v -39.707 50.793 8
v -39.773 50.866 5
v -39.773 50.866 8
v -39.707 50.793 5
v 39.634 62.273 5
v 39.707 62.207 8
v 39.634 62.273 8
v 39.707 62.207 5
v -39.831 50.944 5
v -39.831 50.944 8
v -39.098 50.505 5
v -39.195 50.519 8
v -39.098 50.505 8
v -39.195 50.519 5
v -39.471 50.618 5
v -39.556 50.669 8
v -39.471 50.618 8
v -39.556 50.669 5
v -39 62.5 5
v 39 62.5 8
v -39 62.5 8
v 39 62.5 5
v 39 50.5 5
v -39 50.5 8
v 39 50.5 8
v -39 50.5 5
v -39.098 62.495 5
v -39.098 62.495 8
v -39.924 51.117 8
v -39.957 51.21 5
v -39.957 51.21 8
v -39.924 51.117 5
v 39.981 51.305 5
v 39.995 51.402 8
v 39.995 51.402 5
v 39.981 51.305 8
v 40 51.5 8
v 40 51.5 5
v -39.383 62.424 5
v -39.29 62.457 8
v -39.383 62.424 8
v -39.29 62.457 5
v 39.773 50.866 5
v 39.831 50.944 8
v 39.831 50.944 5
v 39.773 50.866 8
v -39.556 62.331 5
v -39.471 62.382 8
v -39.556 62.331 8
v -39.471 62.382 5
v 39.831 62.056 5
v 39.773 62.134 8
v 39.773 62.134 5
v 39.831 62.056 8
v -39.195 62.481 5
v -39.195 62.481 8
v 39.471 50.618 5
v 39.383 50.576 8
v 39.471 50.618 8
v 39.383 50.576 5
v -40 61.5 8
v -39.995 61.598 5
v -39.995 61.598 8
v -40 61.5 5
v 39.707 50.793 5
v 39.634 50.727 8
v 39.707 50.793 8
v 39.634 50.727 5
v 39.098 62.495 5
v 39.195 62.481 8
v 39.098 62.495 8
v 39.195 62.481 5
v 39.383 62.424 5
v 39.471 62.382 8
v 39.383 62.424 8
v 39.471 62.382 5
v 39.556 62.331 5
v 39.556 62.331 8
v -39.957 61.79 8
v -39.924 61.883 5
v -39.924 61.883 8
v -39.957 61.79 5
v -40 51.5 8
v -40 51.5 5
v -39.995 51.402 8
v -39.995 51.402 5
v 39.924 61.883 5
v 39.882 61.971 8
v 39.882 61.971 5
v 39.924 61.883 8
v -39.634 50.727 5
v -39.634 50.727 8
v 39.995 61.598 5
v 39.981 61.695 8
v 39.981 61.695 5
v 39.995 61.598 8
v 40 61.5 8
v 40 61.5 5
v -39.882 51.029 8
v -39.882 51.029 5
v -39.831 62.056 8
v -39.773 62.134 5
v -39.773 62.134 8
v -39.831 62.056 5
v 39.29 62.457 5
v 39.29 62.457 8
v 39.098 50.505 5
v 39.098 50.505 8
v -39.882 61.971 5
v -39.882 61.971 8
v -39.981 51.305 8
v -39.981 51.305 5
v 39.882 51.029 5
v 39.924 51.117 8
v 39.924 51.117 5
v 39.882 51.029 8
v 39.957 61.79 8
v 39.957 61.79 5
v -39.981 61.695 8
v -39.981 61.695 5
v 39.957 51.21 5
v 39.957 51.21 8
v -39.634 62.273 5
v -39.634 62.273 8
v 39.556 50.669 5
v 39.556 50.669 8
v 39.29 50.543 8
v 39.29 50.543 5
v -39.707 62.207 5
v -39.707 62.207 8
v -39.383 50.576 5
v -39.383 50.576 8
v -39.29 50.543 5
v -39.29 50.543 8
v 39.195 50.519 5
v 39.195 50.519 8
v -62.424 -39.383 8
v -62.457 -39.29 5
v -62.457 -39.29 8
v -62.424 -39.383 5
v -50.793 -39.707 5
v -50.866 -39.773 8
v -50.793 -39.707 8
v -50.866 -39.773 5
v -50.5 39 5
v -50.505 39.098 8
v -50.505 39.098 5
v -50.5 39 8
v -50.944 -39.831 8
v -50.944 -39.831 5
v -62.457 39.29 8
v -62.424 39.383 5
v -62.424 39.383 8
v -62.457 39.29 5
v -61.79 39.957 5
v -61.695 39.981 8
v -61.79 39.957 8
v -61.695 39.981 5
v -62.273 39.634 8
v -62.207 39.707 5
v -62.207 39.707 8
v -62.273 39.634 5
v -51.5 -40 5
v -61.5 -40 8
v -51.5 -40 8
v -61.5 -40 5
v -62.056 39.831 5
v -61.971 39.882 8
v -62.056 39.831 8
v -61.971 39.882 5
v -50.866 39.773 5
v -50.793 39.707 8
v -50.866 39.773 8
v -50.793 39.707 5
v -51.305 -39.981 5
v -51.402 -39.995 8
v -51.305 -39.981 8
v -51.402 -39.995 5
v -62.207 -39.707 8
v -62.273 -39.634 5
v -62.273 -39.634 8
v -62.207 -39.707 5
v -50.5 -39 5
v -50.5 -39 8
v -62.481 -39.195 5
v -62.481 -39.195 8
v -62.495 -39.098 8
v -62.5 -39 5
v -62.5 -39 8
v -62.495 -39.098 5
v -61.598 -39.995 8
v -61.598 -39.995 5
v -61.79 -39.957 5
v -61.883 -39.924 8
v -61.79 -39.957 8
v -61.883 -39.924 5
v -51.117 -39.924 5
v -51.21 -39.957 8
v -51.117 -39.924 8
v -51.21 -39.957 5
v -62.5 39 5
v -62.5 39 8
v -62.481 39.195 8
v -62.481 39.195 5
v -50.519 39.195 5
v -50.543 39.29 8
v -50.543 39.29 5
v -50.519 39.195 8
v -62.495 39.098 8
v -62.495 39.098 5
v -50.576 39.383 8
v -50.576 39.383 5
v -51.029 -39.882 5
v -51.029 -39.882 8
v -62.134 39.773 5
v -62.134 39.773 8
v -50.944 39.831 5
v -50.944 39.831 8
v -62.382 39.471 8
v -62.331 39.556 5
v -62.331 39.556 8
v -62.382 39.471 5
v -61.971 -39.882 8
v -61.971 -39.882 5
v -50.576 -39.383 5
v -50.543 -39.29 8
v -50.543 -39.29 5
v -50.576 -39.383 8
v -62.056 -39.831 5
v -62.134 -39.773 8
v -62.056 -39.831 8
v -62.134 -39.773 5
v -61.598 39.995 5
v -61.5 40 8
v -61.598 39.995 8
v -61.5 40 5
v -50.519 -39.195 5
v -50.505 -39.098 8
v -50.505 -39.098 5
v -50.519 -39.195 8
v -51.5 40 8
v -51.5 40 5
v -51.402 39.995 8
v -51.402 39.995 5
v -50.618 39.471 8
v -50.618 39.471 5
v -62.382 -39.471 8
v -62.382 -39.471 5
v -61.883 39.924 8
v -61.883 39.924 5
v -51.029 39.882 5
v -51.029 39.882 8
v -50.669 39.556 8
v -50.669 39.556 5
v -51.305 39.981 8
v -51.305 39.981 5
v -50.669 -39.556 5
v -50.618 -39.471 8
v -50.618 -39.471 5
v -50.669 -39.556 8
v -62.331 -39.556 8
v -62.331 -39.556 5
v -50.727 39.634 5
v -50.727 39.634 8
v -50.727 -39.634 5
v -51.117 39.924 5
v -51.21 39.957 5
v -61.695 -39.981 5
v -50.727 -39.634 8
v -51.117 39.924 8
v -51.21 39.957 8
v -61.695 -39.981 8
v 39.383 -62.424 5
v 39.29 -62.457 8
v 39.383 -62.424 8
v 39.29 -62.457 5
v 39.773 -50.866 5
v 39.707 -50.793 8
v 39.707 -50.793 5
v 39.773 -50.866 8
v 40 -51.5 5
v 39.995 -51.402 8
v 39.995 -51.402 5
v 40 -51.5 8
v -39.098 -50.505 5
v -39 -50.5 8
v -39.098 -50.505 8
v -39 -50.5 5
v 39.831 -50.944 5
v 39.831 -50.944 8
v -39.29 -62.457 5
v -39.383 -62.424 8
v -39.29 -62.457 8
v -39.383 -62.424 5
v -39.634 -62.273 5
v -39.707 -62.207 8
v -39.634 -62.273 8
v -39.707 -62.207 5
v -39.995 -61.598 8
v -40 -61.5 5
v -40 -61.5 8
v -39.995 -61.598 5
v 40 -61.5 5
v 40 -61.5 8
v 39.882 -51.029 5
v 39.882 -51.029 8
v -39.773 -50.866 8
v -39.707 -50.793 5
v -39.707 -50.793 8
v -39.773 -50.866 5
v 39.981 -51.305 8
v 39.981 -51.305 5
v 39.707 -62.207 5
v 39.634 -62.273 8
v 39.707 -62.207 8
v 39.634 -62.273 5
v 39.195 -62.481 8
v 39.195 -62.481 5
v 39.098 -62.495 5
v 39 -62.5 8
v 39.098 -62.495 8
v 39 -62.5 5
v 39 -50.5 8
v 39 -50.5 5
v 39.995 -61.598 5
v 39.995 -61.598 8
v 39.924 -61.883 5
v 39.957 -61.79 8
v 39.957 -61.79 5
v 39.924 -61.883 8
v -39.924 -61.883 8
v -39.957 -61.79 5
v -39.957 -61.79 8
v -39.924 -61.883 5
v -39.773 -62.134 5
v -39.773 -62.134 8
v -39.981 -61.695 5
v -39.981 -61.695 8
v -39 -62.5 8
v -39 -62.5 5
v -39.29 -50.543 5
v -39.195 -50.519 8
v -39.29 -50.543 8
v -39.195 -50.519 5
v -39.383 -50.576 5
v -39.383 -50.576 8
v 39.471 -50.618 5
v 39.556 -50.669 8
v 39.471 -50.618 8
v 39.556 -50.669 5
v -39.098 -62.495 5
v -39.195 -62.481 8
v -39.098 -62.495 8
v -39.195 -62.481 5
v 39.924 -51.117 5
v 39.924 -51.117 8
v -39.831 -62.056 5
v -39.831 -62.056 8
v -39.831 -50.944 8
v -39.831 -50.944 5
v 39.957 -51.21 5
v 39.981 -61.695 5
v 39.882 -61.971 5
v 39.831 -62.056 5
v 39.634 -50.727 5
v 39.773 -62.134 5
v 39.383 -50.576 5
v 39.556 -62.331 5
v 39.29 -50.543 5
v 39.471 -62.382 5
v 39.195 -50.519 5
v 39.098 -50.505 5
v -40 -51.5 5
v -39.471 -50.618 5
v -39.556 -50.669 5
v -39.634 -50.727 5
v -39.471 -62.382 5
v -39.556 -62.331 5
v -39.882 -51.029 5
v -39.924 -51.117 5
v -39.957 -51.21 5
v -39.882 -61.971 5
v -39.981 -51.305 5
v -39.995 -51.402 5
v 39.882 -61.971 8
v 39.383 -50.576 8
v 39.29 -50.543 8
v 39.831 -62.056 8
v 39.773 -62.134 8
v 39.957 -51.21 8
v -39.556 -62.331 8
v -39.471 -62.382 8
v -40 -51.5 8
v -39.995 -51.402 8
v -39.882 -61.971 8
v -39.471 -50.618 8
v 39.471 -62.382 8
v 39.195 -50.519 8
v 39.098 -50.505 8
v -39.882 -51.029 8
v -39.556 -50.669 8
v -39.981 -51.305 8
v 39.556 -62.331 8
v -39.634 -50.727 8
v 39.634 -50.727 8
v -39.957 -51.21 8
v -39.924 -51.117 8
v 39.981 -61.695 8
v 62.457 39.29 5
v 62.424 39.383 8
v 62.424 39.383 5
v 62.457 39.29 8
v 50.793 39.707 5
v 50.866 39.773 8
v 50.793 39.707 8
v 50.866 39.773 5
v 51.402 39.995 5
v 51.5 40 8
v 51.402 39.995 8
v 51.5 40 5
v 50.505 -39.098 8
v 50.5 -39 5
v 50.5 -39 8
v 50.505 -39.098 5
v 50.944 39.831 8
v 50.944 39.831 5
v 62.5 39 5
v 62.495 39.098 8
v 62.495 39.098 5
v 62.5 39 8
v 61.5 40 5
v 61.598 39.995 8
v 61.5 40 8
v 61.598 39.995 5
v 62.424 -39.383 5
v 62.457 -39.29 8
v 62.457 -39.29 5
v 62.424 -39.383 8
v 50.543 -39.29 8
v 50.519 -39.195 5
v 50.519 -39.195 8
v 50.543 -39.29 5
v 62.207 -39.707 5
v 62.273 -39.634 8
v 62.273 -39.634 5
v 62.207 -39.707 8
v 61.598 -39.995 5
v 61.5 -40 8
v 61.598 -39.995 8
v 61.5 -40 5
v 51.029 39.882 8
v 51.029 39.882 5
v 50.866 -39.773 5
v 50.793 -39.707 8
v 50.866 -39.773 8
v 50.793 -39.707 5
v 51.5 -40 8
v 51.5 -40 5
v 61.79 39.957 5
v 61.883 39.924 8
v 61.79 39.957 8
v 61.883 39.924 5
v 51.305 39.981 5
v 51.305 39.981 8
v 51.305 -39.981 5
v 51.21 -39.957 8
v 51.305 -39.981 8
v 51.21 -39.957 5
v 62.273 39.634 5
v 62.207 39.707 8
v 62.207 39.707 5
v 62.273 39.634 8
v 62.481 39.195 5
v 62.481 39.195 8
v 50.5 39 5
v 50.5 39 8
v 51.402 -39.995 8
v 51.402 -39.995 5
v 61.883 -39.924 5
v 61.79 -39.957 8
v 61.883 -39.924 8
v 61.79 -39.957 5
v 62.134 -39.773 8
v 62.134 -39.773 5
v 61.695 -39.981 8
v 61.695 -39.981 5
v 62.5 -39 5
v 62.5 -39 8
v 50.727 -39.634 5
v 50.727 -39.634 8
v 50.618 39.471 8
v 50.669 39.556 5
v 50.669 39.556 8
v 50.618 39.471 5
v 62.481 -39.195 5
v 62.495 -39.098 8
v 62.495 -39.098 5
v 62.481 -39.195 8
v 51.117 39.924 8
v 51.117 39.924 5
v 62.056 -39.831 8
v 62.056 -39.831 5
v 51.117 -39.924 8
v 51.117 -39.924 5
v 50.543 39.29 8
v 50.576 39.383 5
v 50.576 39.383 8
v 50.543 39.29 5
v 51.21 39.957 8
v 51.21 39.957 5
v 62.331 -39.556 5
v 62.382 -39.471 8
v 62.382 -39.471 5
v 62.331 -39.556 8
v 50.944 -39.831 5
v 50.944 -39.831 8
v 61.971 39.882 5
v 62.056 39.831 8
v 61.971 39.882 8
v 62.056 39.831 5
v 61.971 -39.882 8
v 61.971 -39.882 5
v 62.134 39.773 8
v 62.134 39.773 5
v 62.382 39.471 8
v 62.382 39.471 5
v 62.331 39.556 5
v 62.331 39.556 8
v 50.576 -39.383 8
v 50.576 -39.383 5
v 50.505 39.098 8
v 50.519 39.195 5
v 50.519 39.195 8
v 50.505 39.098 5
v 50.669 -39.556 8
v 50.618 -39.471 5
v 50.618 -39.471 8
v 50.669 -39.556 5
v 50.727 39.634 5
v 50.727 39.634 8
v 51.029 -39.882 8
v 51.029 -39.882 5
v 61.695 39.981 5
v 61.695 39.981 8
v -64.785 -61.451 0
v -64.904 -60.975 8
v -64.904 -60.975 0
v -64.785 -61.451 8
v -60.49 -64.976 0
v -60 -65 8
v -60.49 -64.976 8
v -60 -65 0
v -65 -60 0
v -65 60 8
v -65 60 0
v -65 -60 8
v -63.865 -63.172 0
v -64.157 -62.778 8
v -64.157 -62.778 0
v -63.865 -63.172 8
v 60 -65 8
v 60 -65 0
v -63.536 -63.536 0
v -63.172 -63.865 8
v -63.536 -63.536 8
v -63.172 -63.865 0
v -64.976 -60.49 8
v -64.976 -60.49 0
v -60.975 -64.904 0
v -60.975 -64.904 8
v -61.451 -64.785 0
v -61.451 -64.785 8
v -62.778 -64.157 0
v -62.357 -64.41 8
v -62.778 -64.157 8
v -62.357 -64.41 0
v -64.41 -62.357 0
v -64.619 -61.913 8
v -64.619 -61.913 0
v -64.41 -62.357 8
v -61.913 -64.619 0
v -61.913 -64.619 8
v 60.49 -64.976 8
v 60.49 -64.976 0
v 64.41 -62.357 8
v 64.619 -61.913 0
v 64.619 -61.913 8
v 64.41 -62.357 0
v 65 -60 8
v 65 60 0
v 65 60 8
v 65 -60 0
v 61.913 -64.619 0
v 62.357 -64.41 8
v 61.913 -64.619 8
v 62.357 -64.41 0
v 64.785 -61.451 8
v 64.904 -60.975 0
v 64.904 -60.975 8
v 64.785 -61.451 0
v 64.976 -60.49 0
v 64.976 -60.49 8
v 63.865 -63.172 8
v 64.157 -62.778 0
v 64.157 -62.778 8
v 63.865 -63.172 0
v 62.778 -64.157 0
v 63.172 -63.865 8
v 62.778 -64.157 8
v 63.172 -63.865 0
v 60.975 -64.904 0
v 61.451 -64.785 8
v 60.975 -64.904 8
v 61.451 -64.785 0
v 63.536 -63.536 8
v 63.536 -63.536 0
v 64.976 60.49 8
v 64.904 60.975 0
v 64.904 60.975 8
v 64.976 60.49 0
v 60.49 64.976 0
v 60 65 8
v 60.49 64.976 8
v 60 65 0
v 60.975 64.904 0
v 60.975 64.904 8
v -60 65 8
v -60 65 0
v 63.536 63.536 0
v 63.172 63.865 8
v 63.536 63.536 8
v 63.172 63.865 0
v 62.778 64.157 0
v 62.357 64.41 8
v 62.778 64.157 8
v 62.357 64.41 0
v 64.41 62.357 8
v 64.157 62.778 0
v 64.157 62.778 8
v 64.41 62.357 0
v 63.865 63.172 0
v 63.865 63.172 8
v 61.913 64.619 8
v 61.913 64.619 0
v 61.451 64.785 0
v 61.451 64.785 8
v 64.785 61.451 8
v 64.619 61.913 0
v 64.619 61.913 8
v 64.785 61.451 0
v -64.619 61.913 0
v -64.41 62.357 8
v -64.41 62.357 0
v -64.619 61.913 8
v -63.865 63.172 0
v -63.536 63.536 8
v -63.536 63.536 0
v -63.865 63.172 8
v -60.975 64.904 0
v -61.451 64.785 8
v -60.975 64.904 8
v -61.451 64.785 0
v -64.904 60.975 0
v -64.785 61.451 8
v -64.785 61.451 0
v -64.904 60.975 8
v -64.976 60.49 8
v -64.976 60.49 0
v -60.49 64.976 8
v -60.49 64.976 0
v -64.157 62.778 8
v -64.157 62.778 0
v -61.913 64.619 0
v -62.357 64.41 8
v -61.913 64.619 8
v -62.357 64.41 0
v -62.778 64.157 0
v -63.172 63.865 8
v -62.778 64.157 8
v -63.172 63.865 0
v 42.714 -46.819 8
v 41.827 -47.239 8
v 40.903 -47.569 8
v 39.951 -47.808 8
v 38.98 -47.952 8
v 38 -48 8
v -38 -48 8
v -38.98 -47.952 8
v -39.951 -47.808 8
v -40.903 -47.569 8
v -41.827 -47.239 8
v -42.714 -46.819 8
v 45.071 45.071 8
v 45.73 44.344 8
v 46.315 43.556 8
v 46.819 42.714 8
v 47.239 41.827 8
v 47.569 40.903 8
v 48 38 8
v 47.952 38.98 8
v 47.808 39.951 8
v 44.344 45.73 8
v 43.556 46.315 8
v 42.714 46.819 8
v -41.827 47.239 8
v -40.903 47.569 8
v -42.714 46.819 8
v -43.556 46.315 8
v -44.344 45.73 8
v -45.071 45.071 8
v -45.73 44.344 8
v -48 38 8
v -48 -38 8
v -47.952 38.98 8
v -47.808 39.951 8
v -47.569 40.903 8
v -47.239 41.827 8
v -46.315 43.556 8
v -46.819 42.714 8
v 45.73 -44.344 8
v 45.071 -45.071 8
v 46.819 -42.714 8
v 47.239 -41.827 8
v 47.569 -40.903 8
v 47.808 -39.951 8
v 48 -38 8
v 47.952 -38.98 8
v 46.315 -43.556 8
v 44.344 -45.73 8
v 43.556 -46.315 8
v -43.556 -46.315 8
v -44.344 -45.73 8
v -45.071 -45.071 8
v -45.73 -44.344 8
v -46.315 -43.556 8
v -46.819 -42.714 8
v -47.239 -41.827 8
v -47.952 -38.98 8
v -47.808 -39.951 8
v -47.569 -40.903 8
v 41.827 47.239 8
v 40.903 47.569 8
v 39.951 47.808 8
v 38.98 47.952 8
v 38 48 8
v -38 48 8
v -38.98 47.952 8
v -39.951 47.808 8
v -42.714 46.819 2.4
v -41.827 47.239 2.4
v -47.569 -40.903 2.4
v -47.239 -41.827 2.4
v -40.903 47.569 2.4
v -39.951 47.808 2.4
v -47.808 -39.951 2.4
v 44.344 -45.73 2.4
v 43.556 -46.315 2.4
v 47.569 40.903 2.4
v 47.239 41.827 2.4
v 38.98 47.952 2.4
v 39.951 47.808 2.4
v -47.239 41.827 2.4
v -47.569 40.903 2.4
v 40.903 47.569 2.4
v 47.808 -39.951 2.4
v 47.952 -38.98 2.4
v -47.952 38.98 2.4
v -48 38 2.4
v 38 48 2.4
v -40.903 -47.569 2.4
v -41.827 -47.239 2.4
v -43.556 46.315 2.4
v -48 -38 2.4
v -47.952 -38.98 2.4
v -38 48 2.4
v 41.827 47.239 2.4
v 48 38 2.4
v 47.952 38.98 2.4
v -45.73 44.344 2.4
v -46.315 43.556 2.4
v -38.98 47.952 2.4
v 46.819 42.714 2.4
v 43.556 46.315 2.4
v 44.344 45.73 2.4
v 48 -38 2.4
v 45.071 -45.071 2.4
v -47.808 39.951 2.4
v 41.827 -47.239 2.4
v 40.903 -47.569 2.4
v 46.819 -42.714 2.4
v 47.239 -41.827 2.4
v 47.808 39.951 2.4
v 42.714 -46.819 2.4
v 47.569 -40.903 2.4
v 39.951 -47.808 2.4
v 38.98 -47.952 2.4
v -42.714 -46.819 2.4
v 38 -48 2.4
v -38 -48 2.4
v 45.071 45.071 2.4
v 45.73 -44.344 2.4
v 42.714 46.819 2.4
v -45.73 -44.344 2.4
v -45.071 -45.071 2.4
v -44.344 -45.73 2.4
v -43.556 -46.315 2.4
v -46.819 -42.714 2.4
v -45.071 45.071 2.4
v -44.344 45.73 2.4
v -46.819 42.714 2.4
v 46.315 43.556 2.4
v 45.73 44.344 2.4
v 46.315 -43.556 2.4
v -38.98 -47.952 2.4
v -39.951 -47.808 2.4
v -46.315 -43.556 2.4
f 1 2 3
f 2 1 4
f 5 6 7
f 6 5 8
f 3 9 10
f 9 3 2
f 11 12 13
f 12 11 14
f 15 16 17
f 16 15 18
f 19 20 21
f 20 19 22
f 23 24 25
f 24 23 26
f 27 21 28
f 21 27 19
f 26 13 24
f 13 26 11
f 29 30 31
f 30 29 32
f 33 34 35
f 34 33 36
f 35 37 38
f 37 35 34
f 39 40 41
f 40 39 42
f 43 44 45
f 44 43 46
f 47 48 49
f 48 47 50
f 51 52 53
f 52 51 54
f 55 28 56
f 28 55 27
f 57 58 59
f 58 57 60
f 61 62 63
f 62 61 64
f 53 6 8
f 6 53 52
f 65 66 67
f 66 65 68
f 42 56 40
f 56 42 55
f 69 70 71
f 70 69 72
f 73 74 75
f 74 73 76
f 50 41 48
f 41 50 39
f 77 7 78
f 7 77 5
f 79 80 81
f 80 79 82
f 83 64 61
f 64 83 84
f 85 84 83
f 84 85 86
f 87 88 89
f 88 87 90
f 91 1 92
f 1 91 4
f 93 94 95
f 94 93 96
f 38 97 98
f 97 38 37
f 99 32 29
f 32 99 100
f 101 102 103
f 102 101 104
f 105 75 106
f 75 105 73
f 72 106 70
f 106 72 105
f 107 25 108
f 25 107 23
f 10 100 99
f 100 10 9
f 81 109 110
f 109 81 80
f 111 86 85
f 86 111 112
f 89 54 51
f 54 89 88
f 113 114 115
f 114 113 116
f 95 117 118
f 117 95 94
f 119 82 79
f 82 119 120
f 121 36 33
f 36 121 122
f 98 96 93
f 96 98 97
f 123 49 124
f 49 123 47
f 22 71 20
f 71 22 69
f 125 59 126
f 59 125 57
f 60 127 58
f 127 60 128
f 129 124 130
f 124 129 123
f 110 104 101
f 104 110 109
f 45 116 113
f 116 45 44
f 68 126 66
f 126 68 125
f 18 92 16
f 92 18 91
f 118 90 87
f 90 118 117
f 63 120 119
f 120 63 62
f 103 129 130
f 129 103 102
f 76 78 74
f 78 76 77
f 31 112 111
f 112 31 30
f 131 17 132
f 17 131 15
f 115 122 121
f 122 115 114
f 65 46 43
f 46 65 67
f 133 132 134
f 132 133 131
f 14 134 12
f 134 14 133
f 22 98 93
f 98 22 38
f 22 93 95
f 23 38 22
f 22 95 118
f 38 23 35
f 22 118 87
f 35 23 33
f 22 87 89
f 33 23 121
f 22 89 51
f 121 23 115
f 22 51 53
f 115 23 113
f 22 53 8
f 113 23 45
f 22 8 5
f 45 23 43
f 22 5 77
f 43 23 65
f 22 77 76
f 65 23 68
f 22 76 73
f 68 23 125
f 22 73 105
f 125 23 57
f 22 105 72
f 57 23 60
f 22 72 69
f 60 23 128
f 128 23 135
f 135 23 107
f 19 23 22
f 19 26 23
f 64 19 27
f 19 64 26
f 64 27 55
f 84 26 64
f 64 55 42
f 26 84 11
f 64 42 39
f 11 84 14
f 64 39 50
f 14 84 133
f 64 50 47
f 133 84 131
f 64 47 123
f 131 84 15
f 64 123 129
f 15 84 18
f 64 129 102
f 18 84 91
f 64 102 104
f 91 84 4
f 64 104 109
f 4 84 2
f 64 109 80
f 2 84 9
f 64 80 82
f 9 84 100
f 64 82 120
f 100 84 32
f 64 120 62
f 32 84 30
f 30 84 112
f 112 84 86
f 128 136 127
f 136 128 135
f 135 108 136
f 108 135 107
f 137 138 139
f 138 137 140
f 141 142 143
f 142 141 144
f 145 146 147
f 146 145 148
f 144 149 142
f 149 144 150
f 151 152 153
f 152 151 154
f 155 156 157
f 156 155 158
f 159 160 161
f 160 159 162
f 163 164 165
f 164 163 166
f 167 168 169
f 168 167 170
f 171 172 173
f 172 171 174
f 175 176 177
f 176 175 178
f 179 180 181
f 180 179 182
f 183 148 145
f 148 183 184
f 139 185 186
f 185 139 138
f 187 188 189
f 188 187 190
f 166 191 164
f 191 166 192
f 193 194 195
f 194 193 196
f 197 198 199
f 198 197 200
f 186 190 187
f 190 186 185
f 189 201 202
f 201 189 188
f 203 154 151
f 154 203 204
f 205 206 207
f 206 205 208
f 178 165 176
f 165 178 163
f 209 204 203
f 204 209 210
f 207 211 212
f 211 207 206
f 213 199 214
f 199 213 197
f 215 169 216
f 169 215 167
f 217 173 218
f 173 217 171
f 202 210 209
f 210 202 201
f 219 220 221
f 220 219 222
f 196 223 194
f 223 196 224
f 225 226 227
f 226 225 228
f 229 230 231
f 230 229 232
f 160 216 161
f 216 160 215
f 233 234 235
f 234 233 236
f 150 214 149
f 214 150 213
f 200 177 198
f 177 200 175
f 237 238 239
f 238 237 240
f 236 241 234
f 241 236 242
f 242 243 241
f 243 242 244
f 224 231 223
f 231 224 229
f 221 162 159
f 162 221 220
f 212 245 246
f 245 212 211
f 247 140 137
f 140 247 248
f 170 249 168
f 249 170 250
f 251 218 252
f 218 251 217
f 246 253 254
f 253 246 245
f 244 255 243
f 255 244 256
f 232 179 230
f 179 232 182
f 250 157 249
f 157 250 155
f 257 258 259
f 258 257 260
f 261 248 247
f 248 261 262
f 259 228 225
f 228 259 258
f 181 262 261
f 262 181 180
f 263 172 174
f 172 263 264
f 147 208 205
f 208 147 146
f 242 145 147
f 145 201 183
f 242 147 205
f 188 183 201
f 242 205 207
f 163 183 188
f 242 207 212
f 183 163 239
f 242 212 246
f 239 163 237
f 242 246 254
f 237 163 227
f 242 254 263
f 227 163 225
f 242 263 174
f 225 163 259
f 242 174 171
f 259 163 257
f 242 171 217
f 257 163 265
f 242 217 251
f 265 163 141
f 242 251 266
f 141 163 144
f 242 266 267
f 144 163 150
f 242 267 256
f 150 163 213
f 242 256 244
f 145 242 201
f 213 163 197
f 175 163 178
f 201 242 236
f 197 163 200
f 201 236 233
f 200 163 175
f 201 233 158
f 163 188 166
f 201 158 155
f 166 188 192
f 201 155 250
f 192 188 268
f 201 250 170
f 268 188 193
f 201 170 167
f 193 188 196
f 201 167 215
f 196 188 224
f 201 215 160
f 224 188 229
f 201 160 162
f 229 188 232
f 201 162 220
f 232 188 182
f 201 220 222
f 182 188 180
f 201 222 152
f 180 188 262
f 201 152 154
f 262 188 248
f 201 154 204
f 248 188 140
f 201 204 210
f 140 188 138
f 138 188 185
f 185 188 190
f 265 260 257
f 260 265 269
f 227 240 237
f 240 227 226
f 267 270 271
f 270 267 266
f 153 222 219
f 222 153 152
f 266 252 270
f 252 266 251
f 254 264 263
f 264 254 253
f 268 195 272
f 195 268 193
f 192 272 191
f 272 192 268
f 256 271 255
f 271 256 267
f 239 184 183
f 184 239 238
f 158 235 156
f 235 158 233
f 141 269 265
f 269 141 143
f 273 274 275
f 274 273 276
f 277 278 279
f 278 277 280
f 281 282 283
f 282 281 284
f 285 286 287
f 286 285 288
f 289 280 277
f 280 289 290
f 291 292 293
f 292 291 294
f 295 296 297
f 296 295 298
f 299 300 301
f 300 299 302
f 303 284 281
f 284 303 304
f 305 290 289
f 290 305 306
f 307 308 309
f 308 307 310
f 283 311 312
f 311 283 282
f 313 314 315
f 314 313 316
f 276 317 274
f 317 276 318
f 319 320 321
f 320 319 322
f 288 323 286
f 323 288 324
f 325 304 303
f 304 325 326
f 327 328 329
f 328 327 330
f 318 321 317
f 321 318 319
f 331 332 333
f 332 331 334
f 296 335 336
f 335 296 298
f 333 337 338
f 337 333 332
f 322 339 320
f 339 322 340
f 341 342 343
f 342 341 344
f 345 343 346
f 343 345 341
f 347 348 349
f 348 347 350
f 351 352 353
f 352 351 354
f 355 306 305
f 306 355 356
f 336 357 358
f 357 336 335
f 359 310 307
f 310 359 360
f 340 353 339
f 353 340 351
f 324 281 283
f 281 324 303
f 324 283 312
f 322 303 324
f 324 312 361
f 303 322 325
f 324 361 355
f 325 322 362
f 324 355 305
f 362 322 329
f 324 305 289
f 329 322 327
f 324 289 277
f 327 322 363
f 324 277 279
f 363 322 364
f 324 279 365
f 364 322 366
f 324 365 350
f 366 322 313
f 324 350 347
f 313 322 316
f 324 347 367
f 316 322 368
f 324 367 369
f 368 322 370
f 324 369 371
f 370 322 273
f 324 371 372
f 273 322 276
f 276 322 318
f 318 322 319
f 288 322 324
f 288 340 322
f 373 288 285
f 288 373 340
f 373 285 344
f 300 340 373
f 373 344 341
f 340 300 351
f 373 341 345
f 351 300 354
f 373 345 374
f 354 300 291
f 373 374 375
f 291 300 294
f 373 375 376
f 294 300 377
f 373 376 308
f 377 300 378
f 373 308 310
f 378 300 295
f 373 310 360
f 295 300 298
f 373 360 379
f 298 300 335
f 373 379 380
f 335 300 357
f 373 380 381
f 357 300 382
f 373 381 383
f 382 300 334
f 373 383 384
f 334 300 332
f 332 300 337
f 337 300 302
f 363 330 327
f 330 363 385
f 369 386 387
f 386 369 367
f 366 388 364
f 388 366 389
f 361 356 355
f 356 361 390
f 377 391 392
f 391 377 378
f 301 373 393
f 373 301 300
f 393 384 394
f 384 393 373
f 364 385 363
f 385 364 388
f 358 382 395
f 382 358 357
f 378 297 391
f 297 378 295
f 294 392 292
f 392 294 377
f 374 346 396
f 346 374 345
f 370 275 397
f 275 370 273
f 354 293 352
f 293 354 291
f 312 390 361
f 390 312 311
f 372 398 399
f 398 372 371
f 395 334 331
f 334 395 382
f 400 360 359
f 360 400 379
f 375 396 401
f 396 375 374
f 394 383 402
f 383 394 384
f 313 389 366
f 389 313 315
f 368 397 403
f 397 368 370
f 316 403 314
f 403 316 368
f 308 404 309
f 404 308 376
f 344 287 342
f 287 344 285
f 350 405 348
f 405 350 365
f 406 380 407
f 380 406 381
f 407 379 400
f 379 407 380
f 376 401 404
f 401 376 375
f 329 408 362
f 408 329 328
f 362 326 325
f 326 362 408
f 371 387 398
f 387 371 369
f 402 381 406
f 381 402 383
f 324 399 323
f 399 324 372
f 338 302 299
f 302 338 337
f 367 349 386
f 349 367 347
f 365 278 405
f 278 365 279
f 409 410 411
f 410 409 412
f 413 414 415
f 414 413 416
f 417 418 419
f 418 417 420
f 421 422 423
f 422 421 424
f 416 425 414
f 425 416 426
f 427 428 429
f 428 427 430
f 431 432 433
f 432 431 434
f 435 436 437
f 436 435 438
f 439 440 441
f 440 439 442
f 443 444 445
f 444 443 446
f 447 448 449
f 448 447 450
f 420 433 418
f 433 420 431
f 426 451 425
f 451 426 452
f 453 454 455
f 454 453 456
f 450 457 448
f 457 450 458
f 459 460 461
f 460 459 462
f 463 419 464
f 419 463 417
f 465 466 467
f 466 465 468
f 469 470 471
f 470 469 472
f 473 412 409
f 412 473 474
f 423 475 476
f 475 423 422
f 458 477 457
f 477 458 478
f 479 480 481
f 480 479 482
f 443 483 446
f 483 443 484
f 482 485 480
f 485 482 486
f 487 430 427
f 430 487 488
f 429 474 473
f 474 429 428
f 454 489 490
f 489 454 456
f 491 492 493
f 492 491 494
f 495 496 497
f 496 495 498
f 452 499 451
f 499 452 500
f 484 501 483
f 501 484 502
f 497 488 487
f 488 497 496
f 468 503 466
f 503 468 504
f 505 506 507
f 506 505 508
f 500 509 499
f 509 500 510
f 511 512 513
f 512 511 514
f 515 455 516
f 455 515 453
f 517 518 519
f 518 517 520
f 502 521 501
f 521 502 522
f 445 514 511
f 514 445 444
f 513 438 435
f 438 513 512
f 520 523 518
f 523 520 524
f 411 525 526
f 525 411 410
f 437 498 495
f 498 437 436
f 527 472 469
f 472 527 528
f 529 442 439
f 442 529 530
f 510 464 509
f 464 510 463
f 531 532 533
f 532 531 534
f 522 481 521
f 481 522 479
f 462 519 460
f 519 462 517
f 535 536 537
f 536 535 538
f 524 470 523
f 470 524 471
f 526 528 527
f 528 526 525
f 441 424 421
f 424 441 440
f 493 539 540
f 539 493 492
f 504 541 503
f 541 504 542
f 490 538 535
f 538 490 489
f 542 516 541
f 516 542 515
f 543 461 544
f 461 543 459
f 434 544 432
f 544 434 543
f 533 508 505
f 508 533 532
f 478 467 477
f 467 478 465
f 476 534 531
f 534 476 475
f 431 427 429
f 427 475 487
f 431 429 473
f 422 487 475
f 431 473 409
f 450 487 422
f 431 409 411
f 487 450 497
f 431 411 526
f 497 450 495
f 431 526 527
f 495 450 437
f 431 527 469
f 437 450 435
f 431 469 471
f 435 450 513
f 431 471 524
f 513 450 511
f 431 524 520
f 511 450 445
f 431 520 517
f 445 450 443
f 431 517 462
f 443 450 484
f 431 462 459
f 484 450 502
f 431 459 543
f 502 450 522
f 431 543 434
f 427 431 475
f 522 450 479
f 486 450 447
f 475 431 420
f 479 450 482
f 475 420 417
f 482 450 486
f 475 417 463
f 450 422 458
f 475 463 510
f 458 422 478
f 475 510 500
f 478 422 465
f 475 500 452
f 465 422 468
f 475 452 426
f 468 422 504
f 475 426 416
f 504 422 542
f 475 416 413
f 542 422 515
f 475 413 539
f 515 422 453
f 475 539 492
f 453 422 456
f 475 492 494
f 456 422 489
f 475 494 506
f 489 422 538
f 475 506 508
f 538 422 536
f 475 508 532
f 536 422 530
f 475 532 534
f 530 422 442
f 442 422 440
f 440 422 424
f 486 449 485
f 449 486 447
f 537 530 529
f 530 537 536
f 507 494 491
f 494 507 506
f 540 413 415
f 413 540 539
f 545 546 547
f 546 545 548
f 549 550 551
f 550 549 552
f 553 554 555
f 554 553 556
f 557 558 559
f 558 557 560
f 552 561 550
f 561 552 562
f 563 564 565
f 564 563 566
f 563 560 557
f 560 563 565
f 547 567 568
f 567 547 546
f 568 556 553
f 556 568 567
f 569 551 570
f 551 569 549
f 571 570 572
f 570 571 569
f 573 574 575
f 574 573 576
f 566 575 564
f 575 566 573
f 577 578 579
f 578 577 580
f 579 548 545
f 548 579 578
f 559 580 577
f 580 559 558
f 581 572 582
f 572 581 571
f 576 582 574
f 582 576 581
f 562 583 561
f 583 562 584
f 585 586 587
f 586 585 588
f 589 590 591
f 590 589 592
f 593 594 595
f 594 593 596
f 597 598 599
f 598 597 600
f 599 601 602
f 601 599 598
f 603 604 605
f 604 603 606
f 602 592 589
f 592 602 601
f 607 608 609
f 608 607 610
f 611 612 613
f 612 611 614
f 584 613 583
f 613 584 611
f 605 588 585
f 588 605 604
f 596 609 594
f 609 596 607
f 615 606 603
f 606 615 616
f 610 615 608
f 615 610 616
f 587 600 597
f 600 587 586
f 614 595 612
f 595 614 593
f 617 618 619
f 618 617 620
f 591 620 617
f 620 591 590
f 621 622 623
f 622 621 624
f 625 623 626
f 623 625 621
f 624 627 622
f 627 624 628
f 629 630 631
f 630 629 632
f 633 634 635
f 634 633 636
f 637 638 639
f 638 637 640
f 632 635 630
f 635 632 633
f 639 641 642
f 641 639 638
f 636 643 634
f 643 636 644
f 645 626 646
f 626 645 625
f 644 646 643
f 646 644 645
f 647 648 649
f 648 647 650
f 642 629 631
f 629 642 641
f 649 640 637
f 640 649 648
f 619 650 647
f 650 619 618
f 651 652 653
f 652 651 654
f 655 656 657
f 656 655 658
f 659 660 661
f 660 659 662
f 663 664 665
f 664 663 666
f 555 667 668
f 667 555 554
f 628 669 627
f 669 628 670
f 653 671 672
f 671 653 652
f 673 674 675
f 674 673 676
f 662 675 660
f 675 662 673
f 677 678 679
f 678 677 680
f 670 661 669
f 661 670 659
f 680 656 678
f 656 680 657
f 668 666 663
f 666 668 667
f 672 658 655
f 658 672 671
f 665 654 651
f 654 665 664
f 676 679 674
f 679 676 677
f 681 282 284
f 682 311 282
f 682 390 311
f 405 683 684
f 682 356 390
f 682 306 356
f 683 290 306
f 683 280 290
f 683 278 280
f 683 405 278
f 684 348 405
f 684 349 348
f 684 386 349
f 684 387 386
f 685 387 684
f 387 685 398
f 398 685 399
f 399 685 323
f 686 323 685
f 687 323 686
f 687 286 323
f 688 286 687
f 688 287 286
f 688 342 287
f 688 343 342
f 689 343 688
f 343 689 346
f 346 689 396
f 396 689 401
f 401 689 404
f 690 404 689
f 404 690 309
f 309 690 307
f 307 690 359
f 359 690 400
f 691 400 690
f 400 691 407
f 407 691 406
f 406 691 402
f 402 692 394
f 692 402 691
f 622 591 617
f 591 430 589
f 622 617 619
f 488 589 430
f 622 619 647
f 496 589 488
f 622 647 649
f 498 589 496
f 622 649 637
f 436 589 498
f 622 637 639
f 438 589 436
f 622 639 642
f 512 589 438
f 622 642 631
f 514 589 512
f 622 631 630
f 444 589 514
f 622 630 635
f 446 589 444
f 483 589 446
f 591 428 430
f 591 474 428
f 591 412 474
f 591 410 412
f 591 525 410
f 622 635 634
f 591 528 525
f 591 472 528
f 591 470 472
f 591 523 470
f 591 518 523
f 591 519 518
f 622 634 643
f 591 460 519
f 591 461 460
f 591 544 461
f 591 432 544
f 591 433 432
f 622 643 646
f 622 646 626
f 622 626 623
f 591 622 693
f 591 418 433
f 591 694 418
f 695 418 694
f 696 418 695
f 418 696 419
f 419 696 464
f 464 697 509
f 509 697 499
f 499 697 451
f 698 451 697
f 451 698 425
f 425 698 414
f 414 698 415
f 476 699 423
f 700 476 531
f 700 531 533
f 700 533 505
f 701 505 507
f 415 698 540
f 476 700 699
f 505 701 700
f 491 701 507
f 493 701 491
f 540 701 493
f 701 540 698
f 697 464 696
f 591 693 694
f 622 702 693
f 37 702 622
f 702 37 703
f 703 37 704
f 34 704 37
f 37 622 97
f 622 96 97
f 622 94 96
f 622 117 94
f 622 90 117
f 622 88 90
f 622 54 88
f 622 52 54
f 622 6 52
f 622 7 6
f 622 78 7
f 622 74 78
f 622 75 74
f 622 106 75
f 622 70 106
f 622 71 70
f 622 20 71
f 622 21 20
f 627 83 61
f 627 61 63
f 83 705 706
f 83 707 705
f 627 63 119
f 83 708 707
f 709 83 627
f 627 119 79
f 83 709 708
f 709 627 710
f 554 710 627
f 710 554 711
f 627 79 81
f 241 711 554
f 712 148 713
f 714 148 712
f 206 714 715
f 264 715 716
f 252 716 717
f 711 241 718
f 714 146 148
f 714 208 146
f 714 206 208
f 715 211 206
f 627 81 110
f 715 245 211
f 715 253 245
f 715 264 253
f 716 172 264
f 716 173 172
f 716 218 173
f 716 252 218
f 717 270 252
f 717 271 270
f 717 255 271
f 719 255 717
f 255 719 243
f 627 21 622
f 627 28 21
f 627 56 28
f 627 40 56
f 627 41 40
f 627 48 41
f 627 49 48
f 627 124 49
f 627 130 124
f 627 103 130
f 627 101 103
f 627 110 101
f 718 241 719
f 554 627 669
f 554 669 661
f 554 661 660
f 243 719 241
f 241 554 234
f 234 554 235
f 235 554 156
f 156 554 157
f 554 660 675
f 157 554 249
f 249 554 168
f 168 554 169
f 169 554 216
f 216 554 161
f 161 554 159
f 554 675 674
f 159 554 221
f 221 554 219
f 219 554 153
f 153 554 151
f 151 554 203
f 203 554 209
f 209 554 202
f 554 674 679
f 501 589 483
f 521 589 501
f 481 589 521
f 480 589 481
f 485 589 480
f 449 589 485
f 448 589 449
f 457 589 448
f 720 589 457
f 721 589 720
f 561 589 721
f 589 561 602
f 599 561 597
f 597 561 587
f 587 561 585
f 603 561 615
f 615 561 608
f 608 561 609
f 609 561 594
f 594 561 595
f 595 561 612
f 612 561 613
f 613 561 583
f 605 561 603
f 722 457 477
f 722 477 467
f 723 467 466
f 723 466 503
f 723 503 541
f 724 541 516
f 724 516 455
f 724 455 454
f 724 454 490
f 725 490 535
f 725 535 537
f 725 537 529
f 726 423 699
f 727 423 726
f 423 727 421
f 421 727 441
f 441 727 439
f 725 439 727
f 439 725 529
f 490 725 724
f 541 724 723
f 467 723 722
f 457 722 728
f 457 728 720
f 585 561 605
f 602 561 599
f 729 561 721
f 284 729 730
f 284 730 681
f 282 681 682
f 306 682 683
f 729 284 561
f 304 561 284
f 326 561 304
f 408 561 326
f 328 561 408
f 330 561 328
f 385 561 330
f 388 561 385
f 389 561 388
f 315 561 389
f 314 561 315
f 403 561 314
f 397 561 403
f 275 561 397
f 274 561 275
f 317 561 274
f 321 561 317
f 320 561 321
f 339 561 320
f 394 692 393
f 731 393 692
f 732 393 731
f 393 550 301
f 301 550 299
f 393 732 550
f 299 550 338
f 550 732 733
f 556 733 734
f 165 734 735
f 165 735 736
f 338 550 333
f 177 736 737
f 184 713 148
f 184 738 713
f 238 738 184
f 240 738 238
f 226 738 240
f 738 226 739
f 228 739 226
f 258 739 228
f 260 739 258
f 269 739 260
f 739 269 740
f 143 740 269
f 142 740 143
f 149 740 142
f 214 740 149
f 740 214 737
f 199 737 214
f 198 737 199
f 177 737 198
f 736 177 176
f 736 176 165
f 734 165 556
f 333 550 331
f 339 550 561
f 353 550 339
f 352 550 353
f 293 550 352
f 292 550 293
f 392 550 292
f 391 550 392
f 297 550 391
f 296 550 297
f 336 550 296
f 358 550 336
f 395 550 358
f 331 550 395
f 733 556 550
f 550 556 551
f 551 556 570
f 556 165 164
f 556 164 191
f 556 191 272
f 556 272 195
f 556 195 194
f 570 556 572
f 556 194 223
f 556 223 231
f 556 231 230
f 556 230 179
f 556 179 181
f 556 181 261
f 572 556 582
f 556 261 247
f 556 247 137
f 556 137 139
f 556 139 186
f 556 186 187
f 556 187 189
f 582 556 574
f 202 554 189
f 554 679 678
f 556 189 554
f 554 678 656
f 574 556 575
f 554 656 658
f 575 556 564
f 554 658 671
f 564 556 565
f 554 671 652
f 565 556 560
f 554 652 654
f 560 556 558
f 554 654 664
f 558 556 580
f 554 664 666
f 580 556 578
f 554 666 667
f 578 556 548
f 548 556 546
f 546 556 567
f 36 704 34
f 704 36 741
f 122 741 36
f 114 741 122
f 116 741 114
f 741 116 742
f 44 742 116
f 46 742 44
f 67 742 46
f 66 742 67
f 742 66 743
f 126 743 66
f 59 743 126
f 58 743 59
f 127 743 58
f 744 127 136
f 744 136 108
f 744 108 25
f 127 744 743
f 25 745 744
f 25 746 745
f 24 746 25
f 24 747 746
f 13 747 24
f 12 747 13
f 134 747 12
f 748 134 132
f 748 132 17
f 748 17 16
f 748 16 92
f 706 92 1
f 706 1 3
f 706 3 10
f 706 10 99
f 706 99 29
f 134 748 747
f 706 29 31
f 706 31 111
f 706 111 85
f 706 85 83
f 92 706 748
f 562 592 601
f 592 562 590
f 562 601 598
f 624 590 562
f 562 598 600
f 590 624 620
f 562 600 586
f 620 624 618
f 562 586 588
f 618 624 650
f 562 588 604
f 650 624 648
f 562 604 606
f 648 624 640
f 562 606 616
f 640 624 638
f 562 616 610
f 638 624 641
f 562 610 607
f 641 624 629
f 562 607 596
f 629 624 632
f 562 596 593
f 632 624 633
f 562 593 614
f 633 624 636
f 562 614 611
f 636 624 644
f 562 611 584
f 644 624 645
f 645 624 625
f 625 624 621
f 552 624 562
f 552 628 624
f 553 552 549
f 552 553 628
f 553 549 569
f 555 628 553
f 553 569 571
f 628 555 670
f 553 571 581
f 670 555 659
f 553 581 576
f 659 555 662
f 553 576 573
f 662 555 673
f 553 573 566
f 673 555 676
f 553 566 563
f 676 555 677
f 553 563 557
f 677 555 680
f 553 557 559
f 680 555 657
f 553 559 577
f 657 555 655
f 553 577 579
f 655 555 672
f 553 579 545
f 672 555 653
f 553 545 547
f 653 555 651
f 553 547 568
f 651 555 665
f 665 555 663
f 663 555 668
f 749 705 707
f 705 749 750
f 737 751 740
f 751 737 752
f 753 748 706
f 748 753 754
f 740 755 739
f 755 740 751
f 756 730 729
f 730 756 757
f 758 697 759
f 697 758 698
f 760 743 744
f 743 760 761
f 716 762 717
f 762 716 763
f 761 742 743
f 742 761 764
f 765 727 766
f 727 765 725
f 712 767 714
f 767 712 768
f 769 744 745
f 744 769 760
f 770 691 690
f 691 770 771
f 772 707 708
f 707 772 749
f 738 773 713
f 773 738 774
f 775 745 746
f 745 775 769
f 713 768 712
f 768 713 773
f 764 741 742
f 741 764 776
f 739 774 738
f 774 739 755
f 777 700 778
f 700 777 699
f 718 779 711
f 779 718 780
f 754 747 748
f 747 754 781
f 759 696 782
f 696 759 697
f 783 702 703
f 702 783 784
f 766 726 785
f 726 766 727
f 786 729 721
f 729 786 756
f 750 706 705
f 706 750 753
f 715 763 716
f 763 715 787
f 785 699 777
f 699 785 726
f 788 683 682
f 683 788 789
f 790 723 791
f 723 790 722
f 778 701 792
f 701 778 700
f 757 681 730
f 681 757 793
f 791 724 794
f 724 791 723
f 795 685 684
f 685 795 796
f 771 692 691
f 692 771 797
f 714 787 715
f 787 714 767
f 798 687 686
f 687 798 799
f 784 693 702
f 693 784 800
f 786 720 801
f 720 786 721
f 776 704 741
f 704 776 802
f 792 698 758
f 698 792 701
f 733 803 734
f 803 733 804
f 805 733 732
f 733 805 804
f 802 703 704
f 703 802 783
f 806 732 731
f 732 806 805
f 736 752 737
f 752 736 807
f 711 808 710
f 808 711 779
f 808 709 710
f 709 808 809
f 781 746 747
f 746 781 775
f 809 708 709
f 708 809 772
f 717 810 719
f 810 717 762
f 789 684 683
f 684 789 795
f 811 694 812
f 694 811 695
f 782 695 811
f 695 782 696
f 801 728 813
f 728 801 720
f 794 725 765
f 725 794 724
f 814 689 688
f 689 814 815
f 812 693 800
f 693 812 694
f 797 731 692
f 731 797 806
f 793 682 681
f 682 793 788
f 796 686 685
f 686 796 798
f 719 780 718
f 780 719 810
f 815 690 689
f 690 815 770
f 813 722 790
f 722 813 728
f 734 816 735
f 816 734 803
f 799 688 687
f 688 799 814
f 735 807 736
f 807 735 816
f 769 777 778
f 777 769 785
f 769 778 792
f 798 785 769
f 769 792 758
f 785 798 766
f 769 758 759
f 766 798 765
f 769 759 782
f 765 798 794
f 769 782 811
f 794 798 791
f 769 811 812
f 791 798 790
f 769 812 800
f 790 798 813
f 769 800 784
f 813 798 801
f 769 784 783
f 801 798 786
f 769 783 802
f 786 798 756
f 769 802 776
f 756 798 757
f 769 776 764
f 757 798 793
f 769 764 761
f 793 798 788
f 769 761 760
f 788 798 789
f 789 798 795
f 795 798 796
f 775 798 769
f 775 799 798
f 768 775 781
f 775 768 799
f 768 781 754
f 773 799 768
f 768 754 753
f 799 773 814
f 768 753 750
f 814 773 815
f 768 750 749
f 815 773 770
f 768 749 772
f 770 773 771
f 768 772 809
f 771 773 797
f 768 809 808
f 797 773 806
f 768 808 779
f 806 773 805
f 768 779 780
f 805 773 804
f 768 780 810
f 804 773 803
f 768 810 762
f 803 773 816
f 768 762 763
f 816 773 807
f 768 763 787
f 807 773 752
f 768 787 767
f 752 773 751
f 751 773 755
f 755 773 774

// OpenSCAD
/* 손탁 중앙 정렬판 — 130mm 시제품, 방위 표시 포함
본체 노랑 / 주사위 바닥 녹색. part에서 색상별 부품을 선택해 같은 좌표로 내보내세요.
단위 mm. 리치봉 홈 80 x 12 x 깊이 3, 바닥 패드 홈 없음.
東: 빨간 바탕 / 검정 글자, 南西北: 짙은 회색 바탕 / 옅은 회색 글자.
표시를 윗면과 같은 높이의 인레이로 구성. 출력 시 다색 재료 또는 도색 필요.
STL은 색상 정보를 저장하지 않음. part 선택으로 같은 원점의 부품을 내보낼 수 있음.
별도 접착 조립용 공차는 넣지 않았으며 다색 출력/도색을 위한 설계임.
글자 윤곽이 내장되어 폰트 설치 불필요. Noto Sans CJK KR Bold (SIL OFL) 윤곽 사용.
*/
/* [기본 치수 / mm] */
// 전체 가로·세로
side = 130;
// 전체 높이
height = 8;
// 외곽 모서리 반경. 정렬 직선 구간 120mm
corner_radius = 5;
// 주사위 트레이 내부 가로·세로
tray_size = 96;
// 주사위 트레이 바닥 두께. 기본 트레이 깊이 5.6mm
floor_thickness = 2.4;
// 트레이 내부 모서리 반경
tray_radius = 10;

/* [표시용 얕은 홈] */
label_recesses = true;
label_depth = 3.0;
dealer_width = 80;
dealer_length = 12;
wind_width = 26;
wind_length = 8;

/* [바닥 패드 홈] */
pad_recesses = false;
pad_diameter = 10.4;
pad_depth = 0.5;
pad_inset = 12;

/* [방위 표시] */
// 각 자리에서 왼쪽 아래. 아래 東, 오른쪽 南, 위 西, 왼쪽 北.
// assembled: 색상 미리보기. 나머지는 동일 원점의 다색 출력용 부품.
part = "assembled"; // [assembled,body,tray,east_background,other_backgrounds,east_letter,other_letters,backgrounds,letters]
// 녹색 주사위 바닥 표면층 두께
tray_color_depth = 0.6;
badge_size = dealer_length * 1.5;
// 중앙을 향하는 모서리의 둥근 처리 반경
badge_inner_radius = 3;
badge_depth = 1;
letter_depth = 0.6;
letter_size = 10;

/* [Hidden] */
$fn = 64;
eps = 0.02;
rim = (side - tray_size)/2;
label_y = tray_size/2 + rim/2;

assert(side > 0 && height > 0);
assert(corner_radius > 0 && corner_radius < side/2);
assert(tray_radius > 0 && tray_radius < tray_size/2);
assert(tray_size > 0 && rim >= 3, "트레이 주변 벽 두께는 최소 3mm로 설정하세요.");
assert(floor_thickness >= 1.2 && floor_thickness < height);
assert(side - 2*corner_radius >= 120, "정렬 직선 구간은 120mm 이상으로 설정하세요.");
assert(!label_recesses || (rim >= 16 && label_depth > 0 && label_depth < height-1));
assert(!label_recesses || (dealer_length <= rim-4 && wind_length <= rim-4));
assert(!label_recesses || (dealer_width <= tray_size-4 && wind_width <= tray_size/2-10));
assert(!pad_recesses || (pad_depth > 0 && pad_depth < floor_thickness));
assert(!pad_recesses || (pad_inset > corner_radius+pad_diameter/2 && pad_inset < side/2-pad_diameter/2));

module rounded_rect(w, d, r) {
    hull()
        for (x=[-1,1], y=[-1,1])
            translate([x*(w/2-r), y*(d/2-r)])
                circle(r=r);
}

module shallow_slot(w,d) {
    translate([0,0,height-label_depth])
        linear_extrude(height=label_depth+eps)
            rounded_rect(w,d,1);
}

module center_body() {
    difference() {
        linear_extrude(height=height)
            rounded_rect(side,side,corner_radius);
        translate([0,0,floor_thickness-tray_color_depth])
            linear_extrude(height=height-floor_thickness+tray_color_depth+eps)
                rounded_rect(tray_size,tray_size,tray_radius);
        if (label_recesses) {
            for (a=[0,90,180,270])
                rotate([0,0,a])
                    translate([0,label_y,0])
                        shallow_slot(dealer_width,dealer_length);
            // 동/남 표식은 친 표시 홈과 겹치지 않게 한쪽으로 배치
            /*translate([tray_size/2-wind_width/2,label_y,0])
                shallow_slot(wind_width,wind_length);*/
        }
        for (i=[0:3])
            translate([0,0,height-badge_depth])
                linear_extrude(height=badge_depth+eps) badge_shape(i);
        if (pad_recesses)
            for (x=[-1,1], y=[-1,1])
                translate([x*(side/2-pad_inset),y*(side/2-pad_inset),-eps])
                    cylinder(d=pad_diameter,h=pad_depth+eps);
    }
}



// 모서리 여백 0mm. 사각 영역을 판의 외곽으로 잘라 둥근 모서리까지 배경색이 이어집니다.
// x/y 기준점이 같아 판의 대각선에 대해 대칭입니다.
badge_anchor = -side/2;
tray_corner_center = -tray_size/2 + tray_radius;
assert(badge_anchor + badge_size < -dealer_width/2, "방위 표식이 리치봉 홈과 겹칩니다.");
assert(sqrt(2)*abs(badge_anchor + badge_size - tray_corner_center) >= tray_radius,
       "방위 표식이 주사위 트레이와 겹칩니다.");
assert(badge_depth > letter_depth && letter_depth > 0 && badge_depth < height);
assert(letter_size < badge_size-2);
assert(badge_inner_radius > 0 && badge_inner_radius < badge_size/2);

module badge_location(i) {
    rotate([0,0,90*i])
        translate([badge_anchor+badge_size/2,badge_anchor+badge_size/2,0]) children();
}
module badge_shape(i) {
    intersection() {
        rounded_rect(side,side,corner_radius);
        badge_location(i) difference() {
            square([badge_size,badge_size],center=true);
            // 기본 좌하단 표식의 우상단 모서리만 둥글게 처리하고 각 자리로 회전.
            translate([badge_size/2-badge_inner_radius,badge_size/2-badge_inner_radius])
                difference() {
                    square([badge_inner_radius+eps,badge_inner_radius+eps]);
                    circle(r=badge_inner_radius);
                }
        }
    }
}
module glyph(i) {
    scale([letter_size,letter_size]) glyph_outline(i);
}
module letter(i) {
    badge_location(i) translate([0,0,height-letter_depth])
        linear_extrude(height=letter_depth) glyph(i);
}
module background(i) {
    difference() {
        translate([0,0,height-badge_depth])
            linear_extrude(height=badge_depth) badge_shape(i);
        badge_location(i) translate([0,0,height-letter_depth])
            linear_extrude(height=letter_depth+eps) glyph(i);
    }
}
assert(tray_color_depth > 0 && tray_color_depth < floor_thickness);
// 녹색 표면층은 원래 바닥 높이와 일치하며, 아래 본체와 빈틈 없이 맞닿음.
module tray_surface() {
    translate([0,0,floor_thickness-tray_color_depth])
        linear_extrude(height=tray_color_depth)
            rounded_rect(tray_size,tray_size,tray_radius);
}
// 각 색상 부품의 불리언 연산을 먼저 확정하여 F5 미리보기의 동일 평면 잔상을 방지.
// 치수, 부품 경계, 출력용 형상은 변경하지 않습니다.
if (part=="assembled" || part=="body") color([1.0,0.82,0.05]) render(convexity=10) center_body();
if (part=="assembled" || part=="tray") color([0.53,0.72,0.18]) render(convexity=10) tray_surface();
for(i=[0:3]) {
    if(part=="assembled" || part=="backgrounds" || (part=="east_background" && i==0) || (part=="other_backgrounds" && i>0))
        color(i==0 ? [0.82,0.04,0.06] : [0.18,0.19,0.21]) render(convexity=10) background(i);
    if(part=="assembled" || part=="letters" || (part=="east_letter" && i==0) || (part=="other_letters" && i>0))
        color(i==0 ? [0.02,0.02,0.02] : [0.82,0.83,0.85]) render(convexity=10) letter(i);
}

// Embedded normalized CJK outlines, 東 南 西 北
module glyph_outline(i) {
    if(i==0) polygon(points=[[-0.380575, 0.230922], [-0.380575, -0.176082], [-0.165015, -0.176082], [-0.315576, -0.297076], [-0.5, -0.376941], [-0.452015, -0.427073], [-0.412289, -0.483647], [-0.227866, -0.388008], [-0.070862, -0.243641], [-0.070862, -0.496366], [0.061282, -0.496366], [0.061282, -0.238355], [0.220846, -0.388008], [0.409151, -0.485795], [0.449207, -0.426577], [0.5, -0.375785], [0.311282, -0.296498], [0.157417, -0.176082], [0.385861, -0.176082], [0.385861, 0.230922], [0.061282, 0.230922], [0.061282, 0.291212], [0.469277, 0.291212], [0.469277, 0.409647], [0.061282, 0.409647], [0.061282, 0.496366], [-0.070862, 0.496366], [-0.070862, 0.409647], [-0.469442, 0.409647], [-0.469442, 0.291212], [-0.070862, 0.291212], [-0.070862, 0.230922], [-0.256855, -0.016353], [-0.070862, -0.016353], [-0.070862, -0.080938], [-0.256855, -0.080938], [0.061282, -0.016353], [0.255864, -0.016353], [0.255864, -0.080938], [0.061282, -0.080938], [-0.256855, 0.135778], [-0.070862, 0.135778], [-0.070862, 0.072349], [-0.256855, 0.072349], [0.061282, 0.135778], [0.255864, 0.135778], [0.255864, 0.072349], [0.061282, 0.072349]], paths=[[0, 1, 2, 3, 4, 5, 6, 7, 8, 9, 10, 11, 12, 13, 14, 15, 16, 17, 18, 19, 20, 21, 22, 23, 24, 25, 26, 27, 28, 29, 30, 31], [32, 33, 34, 35], [36, 37, 38, 39], [40, 41, 42, 43], [44, 45, 46, 47]]);
    if(i==1) polygon(points=[[-0.068884, 0.5], [-0.068884, 0.418347], [-0.477487, 0.418347], [-0.477487, 0.297883], [-0.068884, 0.297883], [-0.068884, 0.217238], [-0.436492, 0.217238], [-0.436492, -0.5], [-0.30746, -0.5], [-0.30746, 0.098958], [-0.101142, 0.098958], [-0.199933, 0.069892], [-0.168263, 0.012349], [-0.146169, -0.044019], [-0.240927, -0.044019], [-0.240927, -0.143985], [-0.064516, -0.143985], [-0.064516, -0.215054], [-0.263441, -0.215054], [-0.263441, -0.318212], [-0.064516, -0.318212], [-0.064516, -0.471942], [0.056956, -0.471942], [0.056956, -0.318212], [0.263441, -0.318212], [0.263441, -0.215054], [0.056956, -0.215054], [0.056956, -0.143985], [0.239751, -0.143985], [0.239751, -0.044019], [0.146169, -0.044019], [0.177923, 0.00756], [0.211862, 0.067708], [0.103159, 0.09795], [0.074177, 0.026378], [0.037634, -0.041835], [0.045195, -0.044019], [-0.11828, -0.044019], [-0.036626, -0.017137], [-0.060736, 0.039819], [-0.096774, 0.098958], [0.305444, 0.098958], [0.305444, -0.370968], [0.302167, -0.389785], [0.27957, -0.392473], [0.229083, -0.393481], [0.142977, -0.390289], [0.169355, -0.444052], [0.18498, -0.5], [0.303763, -0.499412], [0.379536, -0.480679], [0.430108, -0.448337], [0.437668, -0.370968], [0.437668, 0.217238], [0.072077, 0.217238], [0.072077, 0.297883], [0.477487, 0.297883], [0.477487, 0.418347], [0.072077, 0.418347], [0.072077, 0.5]], paths=[[0, 1, 2, 3, 4, 5, 6, 7, 8, 9, 10, 11, 12, 13, 14, 15, 16, 17, 18, 19, 20, 21, 22, 23, 24, 25, 26, 27, 28, 29, 30, 31, 32, 33, 34, 35, 36, 37, 38, 39, 40, 41, 42, 43, 44, 45, 46, 47, 48, 49, 50, 51, 52, 53, 54, 55, 56, 57, 58, 59]]);
    if(i==2) polygon(points=[[-0.5, 0.490005], [-0.5, 0.361029], [-0.196332, 0.361029], [-0.196332, 0.240744], [-0.455501, 0.240744], [-0.455501, -0.490005], [-0.325482, -0.490005], [-0.325482, -0.426734], [0.326525, -0.426734], [0.326525, -0.487919], [0.462281, -0.487919], [0.462281, 0.240744], [0.181905, 0.240744], [0.181905, 0.361029], [0.5, 0.361029], [0.5, 0.490005], [-0.325482, -0.303146], [-0.325482, -0.146358], [-0.282027, -0.181384], [-0.250913, -0.215366], [-0.081783, -0.07118], [-0.065096, 0.105163], [-0.065096, 0.11733], [0.047193, 0.11733], [0.047193, -0.011646], [0.057796, -0.140709], [0.177386, -0.158526], [0.270902, -0.158526], [0.302016, -0.157396], [0.326525, -0.149661], [0.326525, -0.303146], [0.175126, 0.11733], [0.326525, 0.11733], [0.326525, -0.007301], [0.300278, 0.003911], [0.282027, 0.016165], [0.276464, -0.037806], [0.255258, -0.041717], [0.199635, -0.041717], [0.176256, -0.040588], [0.175126, -0.010603], [-0.065096, 0.240744], [-0.065096, 0.361029], [0.047193, 0.361029], [0.047193, 0.240744], [-0.325482, -0.118547], [-0.325482, 0.11733], [-0.189727, 0.11733], [-0.189727, 0.108465], [-0.198071, -0.008952]], paths=[[0, 1, 2, 3, 4, 5, 6, 7, 8, 9, 10, 11, 12, 13, 14, 15], [16, 17, 18, 19, 20, 21, 22, 23, 24, 25, 26, 27, 28, 29, 30], [31, 32, 33, 34, 35, 36, 37, 38, 39, 40], [41, 42, 43, 44], [45, 46, 47, 48, 49]]);
    if(i==3) polygon(points=[[-0.5, -0.22649], [-0.443804, -0.355449], [-0.216258, -0.258811], [-0.216258, -0.474013], [-0.086325, -0.474013], [-0.086325, 0.474013], [-0.216258, 0.474013], [-0.216258, 0.244356], [-0.462644, 0.244356], [-0.462644, 0.120594], [-0.216258, 0.120594], [-0.216258, -0.131964], [-0.375264, -0.18751], [0.388745, 0.31923], [0.293081, 0.240702], [0.175654, 0.160062], [0.175654, 0.474013], [0.04572, 0.474013], [0.04572, -0.274403], [0.062855, -0.443235], [0.199529, -0.465568], [0.338883, -0.465568], [0.471902, -0.427156], [0.5, -0.18816], [0.438119, -0.168345], [0.380461, -0.131964], [0.370067, -0.321098], [0.326376, -0.342943], [0.219344, -0.342943], [0.178252, -0.338314], [0.175654, -0.275378], [0.175654, 0.029154], [0.333198, 0.113854], [0.479211, 0.206838]], paths=[[0, 1, 2, 3, 4, 5, 6, 7, 8, 9, 10, 11, 12], [13, 14, 15, 16, 17, 18, 19, 20, 21, 22, 23, 24, 25, 26, 27, 28, 29, 30, 31, 32, 33]]);
}
